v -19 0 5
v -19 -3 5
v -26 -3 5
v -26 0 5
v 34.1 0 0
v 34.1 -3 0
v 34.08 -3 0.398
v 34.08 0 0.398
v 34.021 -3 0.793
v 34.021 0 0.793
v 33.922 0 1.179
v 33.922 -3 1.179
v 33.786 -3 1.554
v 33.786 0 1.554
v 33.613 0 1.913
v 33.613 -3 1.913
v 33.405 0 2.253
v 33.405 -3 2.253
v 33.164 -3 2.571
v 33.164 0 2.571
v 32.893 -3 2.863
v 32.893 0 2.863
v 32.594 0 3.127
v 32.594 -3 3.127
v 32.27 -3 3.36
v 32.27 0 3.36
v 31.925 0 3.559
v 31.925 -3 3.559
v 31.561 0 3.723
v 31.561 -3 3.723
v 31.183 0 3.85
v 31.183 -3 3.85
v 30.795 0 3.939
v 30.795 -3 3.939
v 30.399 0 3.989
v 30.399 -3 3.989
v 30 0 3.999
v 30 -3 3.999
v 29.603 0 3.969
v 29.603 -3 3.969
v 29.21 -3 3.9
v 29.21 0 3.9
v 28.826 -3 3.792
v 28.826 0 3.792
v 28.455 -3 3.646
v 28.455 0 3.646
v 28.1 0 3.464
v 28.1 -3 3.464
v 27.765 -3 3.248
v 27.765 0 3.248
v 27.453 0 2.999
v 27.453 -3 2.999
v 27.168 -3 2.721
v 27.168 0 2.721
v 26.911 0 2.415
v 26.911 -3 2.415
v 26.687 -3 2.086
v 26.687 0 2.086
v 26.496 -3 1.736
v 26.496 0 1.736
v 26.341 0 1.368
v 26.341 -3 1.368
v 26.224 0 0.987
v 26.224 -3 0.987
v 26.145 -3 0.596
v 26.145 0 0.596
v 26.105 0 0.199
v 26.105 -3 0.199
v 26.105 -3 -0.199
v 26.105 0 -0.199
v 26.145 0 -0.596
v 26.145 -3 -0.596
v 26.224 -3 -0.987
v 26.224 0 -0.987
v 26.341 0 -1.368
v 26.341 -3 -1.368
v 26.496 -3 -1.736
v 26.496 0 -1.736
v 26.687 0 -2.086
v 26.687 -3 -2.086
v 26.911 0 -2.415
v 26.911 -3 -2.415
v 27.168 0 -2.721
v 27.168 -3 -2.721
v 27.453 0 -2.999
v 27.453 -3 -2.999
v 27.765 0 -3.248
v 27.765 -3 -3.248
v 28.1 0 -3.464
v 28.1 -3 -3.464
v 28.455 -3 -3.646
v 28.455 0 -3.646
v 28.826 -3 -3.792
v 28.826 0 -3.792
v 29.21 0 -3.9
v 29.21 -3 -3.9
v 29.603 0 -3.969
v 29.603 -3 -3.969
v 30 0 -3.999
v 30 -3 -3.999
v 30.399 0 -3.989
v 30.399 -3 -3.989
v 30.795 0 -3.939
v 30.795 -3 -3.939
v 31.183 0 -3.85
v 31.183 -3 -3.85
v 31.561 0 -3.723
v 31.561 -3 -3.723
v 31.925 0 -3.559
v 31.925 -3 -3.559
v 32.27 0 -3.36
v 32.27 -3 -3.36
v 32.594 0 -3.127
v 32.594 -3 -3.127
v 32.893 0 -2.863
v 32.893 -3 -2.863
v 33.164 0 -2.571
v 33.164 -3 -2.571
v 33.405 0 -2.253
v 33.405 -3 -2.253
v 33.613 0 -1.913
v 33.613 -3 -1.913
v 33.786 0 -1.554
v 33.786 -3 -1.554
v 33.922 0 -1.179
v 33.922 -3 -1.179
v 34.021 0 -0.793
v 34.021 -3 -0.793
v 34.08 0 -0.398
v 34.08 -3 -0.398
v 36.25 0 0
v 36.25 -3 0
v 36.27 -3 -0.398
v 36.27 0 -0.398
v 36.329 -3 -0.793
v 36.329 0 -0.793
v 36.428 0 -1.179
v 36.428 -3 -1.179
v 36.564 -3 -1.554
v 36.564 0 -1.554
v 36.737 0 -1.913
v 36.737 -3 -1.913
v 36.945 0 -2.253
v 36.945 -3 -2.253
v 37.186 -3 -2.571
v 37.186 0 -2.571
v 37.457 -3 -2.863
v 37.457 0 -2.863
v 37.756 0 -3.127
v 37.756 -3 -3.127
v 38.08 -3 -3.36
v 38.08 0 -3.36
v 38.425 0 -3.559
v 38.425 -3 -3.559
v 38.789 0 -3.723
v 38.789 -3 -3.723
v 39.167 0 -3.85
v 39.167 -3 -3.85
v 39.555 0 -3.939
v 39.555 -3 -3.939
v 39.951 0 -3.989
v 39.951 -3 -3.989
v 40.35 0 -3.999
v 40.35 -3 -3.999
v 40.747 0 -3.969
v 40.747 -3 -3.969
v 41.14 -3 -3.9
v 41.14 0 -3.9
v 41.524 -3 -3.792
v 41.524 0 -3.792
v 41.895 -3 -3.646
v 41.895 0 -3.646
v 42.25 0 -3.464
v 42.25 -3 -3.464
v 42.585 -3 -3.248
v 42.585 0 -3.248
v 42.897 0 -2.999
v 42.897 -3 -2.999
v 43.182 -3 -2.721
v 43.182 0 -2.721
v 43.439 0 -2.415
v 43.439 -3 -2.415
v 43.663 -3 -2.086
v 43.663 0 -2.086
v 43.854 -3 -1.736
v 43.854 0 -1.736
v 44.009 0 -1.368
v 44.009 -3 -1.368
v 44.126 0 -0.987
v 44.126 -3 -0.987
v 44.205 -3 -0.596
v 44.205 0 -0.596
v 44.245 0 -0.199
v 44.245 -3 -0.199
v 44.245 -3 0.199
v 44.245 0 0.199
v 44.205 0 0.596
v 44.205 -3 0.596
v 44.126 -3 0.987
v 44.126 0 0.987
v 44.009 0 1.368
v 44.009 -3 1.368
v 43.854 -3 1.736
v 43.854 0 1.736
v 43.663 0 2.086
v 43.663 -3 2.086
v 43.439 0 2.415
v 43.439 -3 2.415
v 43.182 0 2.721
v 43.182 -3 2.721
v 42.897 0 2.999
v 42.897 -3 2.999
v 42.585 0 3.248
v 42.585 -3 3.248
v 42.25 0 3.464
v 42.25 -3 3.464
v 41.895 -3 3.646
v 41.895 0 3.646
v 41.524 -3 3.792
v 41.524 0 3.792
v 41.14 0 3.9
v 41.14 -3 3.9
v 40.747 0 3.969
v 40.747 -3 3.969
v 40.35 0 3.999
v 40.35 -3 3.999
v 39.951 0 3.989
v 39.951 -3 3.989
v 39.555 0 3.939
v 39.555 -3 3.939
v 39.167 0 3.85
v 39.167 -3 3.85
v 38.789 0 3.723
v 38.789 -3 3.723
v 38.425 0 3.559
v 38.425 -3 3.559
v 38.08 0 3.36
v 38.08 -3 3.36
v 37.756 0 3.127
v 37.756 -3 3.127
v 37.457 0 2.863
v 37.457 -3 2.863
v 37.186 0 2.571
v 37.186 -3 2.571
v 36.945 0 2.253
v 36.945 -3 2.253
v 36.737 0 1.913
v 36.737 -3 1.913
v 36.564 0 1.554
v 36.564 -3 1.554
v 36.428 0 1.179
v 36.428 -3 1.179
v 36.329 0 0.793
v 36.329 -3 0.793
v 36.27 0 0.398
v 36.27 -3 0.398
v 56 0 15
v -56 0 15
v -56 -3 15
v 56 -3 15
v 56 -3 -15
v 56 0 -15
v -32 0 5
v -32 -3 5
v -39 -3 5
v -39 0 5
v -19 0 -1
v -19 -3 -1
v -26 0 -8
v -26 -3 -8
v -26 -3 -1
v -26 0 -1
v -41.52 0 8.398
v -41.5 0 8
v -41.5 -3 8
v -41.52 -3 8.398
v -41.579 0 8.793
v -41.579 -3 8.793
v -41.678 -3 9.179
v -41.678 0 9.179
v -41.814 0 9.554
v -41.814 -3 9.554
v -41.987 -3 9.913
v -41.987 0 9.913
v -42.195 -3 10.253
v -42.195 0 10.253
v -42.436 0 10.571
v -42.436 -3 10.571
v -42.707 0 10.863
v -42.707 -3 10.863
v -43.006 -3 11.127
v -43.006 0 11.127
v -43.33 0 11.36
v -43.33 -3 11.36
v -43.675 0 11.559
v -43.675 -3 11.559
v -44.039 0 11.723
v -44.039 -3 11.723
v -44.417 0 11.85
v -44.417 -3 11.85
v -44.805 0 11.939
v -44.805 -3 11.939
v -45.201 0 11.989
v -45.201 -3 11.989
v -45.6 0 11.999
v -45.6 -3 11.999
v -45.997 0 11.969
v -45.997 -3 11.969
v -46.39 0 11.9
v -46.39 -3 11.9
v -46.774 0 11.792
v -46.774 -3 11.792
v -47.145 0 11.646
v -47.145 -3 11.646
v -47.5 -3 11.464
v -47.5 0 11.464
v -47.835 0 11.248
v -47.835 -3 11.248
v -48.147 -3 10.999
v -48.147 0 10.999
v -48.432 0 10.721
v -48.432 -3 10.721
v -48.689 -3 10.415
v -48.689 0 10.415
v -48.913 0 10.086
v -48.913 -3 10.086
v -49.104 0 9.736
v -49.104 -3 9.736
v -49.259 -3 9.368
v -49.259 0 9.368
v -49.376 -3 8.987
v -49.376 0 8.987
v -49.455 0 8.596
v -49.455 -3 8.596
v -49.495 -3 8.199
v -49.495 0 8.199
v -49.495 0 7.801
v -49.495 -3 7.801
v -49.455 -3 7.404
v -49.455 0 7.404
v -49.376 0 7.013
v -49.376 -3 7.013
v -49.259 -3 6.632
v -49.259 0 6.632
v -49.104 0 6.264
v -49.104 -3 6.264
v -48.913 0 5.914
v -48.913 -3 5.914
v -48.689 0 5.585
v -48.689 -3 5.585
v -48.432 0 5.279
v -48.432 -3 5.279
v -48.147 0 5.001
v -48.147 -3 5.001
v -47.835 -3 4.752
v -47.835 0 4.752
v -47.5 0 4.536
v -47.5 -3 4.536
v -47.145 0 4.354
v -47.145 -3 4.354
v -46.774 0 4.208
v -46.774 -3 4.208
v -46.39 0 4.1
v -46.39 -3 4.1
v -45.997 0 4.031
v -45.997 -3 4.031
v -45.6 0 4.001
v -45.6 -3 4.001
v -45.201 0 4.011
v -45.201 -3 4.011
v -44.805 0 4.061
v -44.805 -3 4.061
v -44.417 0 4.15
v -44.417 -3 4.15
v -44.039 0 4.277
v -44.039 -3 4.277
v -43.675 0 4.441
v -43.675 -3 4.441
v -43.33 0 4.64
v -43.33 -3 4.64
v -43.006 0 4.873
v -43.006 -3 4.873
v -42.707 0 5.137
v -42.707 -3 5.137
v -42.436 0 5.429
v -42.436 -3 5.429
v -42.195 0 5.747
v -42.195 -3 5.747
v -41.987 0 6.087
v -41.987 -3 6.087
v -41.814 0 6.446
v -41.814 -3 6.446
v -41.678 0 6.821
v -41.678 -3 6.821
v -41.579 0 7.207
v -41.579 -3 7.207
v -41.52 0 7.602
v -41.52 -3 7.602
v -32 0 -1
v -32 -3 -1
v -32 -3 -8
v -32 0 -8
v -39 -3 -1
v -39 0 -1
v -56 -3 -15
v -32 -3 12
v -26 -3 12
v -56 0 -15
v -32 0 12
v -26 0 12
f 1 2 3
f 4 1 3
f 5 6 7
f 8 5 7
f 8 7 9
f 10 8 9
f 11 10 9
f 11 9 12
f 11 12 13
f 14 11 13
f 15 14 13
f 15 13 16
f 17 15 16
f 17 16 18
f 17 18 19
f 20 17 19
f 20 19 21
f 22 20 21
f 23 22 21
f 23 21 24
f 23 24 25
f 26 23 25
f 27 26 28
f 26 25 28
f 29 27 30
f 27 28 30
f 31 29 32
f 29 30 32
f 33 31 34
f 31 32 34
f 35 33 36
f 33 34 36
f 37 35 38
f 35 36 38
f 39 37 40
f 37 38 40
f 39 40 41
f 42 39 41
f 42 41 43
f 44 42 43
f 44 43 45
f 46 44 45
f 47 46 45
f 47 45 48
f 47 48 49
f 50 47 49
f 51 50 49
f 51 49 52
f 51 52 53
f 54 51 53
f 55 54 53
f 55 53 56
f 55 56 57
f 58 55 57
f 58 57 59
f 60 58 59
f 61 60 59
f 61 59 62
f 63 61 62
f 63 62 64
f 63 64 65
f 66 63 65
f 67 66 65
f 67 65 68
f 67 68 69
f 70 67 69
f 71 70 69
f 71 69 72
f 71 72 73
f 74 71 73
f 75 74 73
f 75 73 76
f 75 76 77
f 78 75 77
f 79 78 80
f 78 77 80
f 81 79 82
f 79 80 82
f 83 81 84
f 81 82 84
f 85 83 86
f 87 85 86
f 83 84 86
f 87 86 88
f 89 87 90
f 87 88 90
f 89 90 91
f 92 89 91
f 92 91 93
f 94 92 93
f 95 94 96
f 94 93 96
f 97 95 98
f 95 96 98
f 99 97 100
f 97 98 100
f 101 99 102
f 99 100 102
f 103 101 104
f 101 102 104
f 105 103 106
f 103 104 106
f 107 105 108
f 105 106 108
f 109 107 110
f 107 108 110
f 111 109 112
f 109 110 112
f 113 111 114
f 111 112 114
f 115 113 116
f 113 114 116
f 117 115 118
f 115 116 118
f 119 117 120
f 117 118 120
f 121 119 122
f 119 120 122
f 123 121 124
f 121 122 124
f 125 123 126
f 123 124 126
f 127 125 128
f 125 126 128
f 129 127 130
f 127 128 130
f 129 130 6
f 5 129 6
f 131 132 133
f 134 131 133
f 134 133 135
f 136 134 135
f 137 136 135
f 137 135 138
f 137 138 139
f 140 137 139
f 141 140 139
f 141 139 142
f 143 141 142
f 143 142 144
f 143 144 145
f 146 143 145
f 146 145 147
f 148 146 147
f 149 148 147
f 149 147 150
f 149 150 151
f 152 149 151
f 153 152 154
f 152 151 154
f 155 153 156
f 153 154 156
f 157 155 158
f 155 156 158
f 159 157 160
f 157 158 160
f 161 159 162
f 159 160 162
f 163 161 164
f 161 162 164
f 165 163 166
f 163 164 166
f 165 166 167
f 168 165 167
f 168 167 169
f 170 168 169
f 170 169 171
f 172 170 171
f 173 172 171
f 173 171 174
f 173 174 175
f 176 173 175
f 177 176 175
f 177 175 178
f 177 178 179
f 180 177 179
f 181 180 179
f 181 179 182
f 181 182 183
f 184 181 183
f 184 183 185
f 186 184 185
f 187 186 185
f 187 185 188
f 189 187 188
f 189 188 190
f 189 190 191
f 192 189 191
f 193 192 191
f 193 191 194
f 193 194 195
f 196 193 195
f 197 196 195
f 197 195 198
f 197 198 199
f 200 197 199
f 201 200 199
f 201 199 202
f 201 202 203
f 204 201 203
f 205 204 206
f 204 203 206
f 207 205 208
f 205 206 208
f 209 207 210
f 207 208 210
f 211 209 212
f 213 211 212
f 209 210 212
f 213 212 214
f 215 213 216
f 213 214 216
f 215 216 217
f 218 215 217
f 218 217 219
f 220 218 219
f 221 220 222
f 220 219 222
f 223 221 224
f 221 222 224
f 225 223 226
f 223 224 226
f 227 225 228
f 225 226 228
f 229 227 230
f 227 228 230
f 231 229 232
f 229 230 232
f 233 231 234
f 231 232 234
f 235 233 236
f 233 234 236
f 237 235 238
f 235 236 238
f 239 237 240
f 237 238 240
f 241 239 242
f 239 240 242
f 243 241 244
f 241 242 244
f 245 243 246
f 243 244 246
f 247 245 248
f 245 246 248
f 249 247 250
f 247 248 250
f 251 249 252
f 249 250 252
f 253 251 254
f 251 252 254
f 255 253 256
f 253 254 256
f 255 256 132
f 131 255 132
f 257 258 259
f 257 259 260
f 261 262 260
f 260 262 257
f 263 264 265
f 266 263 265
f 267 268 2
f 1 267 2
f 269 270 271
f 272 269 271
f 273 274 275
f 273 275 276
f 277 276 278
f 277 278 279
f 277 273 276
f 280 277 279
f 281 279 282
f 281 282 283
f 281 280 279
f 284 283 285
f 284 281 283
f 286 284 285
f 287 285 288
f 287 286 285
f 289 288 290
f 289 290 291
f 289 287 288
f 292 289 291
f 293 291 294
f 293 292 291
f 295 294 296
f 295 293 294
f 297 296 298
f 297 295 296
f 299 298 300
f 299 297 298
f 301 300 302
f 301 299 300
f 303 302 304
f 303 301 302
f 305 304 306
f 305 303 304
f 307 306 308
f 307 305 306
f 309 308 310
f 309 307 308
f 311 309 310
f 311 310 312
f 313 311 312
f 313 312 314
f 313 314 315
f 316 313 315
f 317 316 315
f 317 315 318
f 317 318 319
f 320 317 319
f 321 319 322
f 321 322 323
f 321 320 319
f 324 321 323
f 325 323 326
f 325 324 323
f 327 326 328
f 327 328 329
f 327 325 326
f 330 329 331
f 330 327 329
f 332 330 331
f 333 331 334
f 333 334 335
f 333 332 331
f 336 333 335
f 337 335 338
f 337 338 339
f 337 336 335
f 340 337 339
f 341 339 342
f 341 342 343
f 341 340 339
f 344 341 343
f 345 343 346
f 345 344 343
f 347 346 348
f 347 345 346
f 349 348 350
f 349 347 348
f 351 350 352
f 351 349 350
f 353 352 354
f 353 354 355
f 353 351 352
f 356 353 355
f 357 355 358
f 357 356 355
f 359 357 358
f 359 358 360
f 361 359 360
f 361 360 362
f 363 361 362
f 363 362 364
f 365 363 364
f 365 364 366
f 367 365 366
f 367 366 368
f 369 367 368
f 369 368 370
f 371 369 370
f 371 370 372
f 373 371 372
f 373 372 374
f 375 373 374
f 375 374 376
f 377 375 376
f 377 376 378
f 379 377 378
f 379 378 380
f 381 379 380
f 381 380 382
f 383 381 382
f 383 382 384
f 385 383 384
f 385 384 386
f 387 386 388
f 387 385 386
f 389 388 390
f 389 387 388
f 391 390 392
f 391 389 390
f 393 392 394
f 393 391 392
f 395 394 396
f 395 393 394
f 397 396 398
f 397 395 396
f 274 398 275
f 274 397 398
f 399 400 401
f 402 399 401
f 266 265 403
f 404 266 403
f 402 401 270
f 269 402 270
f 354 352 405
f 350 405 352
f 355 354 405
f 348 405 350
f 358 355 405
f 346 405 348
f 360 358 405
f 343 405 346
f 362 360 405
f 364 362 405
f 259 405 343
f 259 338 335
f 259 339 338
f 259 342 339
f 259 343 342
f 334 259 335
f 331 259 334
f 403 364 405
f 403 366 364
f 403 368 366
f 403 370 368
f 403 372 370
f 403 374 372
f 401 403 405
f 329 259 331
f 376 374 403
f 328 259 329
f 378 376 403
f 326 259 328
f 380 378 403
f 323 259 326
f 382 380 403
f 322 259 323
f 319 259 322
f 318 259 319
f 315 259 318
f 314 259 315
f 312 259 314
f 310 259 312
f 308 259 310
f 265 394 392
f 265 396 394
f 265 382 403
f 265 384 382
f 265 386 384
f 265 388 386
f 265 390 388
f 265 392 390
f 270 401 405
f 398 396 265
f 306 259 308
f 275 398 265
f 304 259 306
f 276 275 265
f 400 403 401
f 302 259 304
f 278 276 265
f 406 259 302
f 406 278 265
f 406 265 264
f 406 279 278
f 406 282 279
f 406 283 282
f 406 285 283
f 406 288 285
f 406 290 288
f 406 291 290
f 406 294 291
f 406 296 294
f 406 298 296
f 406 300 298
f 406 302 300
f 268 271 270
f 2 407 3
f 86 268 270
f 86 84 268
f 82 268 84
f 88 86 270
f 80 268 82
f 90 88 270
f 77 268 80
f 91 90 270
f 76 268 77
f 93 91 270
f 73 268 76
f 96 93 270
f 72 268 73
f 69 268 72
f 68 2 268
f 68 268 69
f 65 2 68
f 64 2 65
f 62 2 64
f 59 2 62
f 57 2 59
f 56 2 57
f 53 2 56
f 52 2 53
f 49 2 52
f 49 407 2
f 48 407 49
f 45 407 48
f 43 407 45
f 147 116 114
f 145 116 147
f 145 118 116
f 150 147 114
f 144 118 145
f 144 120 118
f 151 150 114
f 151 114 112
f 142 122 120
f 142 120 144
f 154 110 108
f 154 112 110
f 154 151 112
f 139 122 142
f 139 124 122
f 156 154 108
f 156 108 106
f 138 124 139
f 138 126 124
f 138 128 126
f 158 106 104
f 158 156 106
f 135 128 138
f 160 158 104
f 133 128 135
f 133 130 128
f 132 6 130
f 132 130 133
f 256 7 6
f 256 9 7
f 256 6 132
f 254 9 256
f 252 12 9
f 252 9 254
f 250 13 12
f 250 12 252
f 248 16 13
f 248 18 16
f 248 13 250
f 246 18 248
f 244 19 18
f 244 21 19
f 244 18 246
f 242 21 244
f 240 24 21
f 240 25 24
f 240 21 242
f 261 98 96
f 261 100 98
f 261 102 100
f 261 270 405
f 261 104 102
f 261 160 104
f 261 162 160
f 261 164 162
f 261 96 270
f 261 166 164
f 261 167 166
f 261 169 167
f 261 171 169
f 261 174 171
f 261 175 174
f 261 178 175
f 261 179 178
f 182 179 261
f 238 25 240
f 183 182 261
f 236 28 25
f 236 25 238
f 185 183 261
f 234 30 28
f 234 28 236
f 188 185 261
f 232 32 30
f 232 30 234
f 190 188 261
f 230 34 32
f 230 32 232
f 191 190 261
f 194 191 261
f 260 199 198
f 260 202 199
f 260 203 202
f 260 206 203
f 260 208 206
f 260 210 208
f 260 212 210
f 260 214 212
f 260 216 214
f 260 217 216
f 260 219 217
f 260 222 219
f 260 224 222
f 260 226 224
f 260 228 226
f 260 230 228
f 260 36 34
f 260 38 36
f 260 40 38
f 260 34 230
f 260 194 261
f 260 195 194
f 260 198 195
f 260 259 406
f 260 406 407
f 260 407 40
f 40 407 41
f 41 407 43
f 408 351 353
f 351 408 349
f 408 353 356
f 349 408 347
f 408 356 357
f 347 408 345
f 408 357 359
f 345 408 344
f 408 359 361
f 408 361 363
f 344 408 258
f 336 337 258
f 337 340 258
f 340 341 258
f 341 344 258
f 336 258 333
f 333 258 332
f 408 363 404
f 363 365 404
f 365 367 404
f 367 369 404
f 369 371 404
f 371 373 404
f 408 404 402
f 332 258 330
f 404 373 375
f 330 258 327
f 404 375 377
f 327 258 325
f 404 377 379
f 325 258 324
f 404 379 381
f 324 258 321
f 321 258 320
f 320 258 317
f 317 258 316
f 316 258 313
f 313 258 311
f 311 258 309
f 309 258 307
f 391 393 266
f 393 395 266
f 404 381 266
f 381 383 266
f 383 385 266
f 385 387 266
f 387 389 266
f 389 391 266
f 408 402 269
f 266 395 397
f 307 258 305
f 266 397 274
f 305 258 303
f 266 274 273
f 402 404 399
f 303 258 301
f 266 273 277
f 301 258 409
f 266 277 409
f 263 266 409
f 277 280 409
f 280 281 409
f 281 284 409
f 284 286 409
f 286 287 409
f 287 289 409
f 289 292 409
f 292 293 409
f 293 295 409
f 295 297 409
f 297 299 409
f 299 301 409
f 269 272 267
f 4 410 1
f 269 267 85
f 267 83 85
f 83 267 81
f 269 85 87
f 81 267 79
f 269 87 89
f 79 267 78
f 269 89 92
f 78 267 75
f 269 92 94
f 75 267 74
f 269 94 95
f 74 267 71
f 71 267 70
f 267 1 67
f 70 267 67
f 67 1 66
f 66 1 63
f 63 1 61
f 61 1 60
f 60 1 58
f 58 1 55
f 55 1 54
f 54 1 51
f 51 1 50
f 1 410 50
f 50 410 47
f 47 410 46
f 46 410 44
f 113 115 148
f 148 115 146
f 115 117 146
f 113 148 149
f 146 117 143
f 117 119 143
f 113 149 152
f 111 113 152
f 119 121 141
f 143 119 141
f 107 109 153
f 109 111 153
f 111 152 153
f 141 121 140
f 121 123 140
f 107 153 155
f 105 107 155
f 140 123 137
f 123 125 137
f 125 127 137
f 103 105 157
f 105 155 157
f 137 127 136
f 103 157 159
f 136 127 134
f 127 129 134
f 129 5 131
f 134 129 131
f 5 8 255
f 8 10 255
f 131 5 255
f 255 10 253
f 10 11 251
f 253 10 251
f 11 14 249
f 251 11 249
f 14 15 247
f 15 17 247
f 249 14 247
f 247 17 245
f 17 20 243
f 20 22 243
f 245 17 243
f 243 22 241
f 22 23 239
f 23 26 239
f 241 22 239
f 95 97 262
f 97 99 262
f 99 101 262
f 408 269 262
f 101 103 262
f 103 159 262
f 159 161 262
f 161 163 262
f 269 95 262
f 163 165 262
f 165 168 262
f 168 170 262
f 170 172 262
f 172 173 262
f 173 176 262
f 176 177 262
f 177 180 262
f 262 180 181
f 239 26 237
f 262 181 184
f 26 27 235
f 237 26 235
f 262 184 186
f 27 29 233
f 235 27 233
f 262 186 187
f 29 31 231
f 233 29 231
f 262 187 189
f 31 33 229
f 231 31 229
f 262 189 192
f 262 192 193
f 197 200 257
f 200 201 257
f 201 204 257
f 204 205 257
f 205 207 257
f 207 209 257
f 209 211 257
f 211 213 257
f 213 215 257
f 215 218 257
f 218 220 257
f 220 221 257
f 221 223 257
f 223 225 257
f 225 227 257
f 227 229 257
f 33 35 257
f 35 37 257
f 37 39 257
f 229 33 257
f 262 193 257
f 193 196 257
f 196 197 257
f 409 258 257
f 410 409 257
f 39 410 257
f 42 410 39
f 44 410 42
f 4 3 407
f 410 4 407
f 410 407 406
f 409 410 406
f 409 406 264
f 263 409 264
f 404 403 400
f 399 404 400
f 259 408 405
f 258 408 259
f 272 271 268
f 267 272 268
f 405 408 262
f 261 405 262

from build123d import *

# Parameters (mm, degrees)
F0_W     = 112
F0_H     = 30
F0_R     = 4
F1_DEPTH = 3
F3_DEPTH = 25
F4_R     = 4
F5_DEPTH = 25


with BuildPart() as f1:
    # F0 (on Front) → F1 (new body)
    with BuildSketch(Plane.XZ):
        Rectangle(F0_W, F0_H)
        with Locations((-45.5, 8)):
            Circle(F0_R, mode=Mode.SUBTRACT)
    extrude(amount=F1_DEPTH)

    # F2 (on face) → F3 (cut)
    with BuildSketch(Plane.XZ.offset(3)):
        Polygon((-39, 5), (-39, 2), (-39, -1), (-32, -1), (-32, -8), (-29, -8), (-26, -8), (-26, -1), (-19, -1), (-19, 2), (-19, 5), (-26, 5), (-26, 12), (-29, 12), (-32, 12), (-32, 5), align=None)
    extrude(amount=-F3_DEPTH, mode=Mode.SUBTRACT)

    # F4 (on face) → F5 (cut)
    with BuildSketch(Plane.XZ.offset(3)):
        with Locations((30.1, 0)):
            Circle(F4_R)
        with BuildLine():
            ThreePointArc((44.25, 0), (40.25, 4), (36.25, 0))
            ThreePointArc((36.25, 0), (40.25, -4), (44.25, 0))
        make_face()
    extrude(amount=-F5_DEPTH, mode=Mode.SUBTRACT)


solid = f1.part
